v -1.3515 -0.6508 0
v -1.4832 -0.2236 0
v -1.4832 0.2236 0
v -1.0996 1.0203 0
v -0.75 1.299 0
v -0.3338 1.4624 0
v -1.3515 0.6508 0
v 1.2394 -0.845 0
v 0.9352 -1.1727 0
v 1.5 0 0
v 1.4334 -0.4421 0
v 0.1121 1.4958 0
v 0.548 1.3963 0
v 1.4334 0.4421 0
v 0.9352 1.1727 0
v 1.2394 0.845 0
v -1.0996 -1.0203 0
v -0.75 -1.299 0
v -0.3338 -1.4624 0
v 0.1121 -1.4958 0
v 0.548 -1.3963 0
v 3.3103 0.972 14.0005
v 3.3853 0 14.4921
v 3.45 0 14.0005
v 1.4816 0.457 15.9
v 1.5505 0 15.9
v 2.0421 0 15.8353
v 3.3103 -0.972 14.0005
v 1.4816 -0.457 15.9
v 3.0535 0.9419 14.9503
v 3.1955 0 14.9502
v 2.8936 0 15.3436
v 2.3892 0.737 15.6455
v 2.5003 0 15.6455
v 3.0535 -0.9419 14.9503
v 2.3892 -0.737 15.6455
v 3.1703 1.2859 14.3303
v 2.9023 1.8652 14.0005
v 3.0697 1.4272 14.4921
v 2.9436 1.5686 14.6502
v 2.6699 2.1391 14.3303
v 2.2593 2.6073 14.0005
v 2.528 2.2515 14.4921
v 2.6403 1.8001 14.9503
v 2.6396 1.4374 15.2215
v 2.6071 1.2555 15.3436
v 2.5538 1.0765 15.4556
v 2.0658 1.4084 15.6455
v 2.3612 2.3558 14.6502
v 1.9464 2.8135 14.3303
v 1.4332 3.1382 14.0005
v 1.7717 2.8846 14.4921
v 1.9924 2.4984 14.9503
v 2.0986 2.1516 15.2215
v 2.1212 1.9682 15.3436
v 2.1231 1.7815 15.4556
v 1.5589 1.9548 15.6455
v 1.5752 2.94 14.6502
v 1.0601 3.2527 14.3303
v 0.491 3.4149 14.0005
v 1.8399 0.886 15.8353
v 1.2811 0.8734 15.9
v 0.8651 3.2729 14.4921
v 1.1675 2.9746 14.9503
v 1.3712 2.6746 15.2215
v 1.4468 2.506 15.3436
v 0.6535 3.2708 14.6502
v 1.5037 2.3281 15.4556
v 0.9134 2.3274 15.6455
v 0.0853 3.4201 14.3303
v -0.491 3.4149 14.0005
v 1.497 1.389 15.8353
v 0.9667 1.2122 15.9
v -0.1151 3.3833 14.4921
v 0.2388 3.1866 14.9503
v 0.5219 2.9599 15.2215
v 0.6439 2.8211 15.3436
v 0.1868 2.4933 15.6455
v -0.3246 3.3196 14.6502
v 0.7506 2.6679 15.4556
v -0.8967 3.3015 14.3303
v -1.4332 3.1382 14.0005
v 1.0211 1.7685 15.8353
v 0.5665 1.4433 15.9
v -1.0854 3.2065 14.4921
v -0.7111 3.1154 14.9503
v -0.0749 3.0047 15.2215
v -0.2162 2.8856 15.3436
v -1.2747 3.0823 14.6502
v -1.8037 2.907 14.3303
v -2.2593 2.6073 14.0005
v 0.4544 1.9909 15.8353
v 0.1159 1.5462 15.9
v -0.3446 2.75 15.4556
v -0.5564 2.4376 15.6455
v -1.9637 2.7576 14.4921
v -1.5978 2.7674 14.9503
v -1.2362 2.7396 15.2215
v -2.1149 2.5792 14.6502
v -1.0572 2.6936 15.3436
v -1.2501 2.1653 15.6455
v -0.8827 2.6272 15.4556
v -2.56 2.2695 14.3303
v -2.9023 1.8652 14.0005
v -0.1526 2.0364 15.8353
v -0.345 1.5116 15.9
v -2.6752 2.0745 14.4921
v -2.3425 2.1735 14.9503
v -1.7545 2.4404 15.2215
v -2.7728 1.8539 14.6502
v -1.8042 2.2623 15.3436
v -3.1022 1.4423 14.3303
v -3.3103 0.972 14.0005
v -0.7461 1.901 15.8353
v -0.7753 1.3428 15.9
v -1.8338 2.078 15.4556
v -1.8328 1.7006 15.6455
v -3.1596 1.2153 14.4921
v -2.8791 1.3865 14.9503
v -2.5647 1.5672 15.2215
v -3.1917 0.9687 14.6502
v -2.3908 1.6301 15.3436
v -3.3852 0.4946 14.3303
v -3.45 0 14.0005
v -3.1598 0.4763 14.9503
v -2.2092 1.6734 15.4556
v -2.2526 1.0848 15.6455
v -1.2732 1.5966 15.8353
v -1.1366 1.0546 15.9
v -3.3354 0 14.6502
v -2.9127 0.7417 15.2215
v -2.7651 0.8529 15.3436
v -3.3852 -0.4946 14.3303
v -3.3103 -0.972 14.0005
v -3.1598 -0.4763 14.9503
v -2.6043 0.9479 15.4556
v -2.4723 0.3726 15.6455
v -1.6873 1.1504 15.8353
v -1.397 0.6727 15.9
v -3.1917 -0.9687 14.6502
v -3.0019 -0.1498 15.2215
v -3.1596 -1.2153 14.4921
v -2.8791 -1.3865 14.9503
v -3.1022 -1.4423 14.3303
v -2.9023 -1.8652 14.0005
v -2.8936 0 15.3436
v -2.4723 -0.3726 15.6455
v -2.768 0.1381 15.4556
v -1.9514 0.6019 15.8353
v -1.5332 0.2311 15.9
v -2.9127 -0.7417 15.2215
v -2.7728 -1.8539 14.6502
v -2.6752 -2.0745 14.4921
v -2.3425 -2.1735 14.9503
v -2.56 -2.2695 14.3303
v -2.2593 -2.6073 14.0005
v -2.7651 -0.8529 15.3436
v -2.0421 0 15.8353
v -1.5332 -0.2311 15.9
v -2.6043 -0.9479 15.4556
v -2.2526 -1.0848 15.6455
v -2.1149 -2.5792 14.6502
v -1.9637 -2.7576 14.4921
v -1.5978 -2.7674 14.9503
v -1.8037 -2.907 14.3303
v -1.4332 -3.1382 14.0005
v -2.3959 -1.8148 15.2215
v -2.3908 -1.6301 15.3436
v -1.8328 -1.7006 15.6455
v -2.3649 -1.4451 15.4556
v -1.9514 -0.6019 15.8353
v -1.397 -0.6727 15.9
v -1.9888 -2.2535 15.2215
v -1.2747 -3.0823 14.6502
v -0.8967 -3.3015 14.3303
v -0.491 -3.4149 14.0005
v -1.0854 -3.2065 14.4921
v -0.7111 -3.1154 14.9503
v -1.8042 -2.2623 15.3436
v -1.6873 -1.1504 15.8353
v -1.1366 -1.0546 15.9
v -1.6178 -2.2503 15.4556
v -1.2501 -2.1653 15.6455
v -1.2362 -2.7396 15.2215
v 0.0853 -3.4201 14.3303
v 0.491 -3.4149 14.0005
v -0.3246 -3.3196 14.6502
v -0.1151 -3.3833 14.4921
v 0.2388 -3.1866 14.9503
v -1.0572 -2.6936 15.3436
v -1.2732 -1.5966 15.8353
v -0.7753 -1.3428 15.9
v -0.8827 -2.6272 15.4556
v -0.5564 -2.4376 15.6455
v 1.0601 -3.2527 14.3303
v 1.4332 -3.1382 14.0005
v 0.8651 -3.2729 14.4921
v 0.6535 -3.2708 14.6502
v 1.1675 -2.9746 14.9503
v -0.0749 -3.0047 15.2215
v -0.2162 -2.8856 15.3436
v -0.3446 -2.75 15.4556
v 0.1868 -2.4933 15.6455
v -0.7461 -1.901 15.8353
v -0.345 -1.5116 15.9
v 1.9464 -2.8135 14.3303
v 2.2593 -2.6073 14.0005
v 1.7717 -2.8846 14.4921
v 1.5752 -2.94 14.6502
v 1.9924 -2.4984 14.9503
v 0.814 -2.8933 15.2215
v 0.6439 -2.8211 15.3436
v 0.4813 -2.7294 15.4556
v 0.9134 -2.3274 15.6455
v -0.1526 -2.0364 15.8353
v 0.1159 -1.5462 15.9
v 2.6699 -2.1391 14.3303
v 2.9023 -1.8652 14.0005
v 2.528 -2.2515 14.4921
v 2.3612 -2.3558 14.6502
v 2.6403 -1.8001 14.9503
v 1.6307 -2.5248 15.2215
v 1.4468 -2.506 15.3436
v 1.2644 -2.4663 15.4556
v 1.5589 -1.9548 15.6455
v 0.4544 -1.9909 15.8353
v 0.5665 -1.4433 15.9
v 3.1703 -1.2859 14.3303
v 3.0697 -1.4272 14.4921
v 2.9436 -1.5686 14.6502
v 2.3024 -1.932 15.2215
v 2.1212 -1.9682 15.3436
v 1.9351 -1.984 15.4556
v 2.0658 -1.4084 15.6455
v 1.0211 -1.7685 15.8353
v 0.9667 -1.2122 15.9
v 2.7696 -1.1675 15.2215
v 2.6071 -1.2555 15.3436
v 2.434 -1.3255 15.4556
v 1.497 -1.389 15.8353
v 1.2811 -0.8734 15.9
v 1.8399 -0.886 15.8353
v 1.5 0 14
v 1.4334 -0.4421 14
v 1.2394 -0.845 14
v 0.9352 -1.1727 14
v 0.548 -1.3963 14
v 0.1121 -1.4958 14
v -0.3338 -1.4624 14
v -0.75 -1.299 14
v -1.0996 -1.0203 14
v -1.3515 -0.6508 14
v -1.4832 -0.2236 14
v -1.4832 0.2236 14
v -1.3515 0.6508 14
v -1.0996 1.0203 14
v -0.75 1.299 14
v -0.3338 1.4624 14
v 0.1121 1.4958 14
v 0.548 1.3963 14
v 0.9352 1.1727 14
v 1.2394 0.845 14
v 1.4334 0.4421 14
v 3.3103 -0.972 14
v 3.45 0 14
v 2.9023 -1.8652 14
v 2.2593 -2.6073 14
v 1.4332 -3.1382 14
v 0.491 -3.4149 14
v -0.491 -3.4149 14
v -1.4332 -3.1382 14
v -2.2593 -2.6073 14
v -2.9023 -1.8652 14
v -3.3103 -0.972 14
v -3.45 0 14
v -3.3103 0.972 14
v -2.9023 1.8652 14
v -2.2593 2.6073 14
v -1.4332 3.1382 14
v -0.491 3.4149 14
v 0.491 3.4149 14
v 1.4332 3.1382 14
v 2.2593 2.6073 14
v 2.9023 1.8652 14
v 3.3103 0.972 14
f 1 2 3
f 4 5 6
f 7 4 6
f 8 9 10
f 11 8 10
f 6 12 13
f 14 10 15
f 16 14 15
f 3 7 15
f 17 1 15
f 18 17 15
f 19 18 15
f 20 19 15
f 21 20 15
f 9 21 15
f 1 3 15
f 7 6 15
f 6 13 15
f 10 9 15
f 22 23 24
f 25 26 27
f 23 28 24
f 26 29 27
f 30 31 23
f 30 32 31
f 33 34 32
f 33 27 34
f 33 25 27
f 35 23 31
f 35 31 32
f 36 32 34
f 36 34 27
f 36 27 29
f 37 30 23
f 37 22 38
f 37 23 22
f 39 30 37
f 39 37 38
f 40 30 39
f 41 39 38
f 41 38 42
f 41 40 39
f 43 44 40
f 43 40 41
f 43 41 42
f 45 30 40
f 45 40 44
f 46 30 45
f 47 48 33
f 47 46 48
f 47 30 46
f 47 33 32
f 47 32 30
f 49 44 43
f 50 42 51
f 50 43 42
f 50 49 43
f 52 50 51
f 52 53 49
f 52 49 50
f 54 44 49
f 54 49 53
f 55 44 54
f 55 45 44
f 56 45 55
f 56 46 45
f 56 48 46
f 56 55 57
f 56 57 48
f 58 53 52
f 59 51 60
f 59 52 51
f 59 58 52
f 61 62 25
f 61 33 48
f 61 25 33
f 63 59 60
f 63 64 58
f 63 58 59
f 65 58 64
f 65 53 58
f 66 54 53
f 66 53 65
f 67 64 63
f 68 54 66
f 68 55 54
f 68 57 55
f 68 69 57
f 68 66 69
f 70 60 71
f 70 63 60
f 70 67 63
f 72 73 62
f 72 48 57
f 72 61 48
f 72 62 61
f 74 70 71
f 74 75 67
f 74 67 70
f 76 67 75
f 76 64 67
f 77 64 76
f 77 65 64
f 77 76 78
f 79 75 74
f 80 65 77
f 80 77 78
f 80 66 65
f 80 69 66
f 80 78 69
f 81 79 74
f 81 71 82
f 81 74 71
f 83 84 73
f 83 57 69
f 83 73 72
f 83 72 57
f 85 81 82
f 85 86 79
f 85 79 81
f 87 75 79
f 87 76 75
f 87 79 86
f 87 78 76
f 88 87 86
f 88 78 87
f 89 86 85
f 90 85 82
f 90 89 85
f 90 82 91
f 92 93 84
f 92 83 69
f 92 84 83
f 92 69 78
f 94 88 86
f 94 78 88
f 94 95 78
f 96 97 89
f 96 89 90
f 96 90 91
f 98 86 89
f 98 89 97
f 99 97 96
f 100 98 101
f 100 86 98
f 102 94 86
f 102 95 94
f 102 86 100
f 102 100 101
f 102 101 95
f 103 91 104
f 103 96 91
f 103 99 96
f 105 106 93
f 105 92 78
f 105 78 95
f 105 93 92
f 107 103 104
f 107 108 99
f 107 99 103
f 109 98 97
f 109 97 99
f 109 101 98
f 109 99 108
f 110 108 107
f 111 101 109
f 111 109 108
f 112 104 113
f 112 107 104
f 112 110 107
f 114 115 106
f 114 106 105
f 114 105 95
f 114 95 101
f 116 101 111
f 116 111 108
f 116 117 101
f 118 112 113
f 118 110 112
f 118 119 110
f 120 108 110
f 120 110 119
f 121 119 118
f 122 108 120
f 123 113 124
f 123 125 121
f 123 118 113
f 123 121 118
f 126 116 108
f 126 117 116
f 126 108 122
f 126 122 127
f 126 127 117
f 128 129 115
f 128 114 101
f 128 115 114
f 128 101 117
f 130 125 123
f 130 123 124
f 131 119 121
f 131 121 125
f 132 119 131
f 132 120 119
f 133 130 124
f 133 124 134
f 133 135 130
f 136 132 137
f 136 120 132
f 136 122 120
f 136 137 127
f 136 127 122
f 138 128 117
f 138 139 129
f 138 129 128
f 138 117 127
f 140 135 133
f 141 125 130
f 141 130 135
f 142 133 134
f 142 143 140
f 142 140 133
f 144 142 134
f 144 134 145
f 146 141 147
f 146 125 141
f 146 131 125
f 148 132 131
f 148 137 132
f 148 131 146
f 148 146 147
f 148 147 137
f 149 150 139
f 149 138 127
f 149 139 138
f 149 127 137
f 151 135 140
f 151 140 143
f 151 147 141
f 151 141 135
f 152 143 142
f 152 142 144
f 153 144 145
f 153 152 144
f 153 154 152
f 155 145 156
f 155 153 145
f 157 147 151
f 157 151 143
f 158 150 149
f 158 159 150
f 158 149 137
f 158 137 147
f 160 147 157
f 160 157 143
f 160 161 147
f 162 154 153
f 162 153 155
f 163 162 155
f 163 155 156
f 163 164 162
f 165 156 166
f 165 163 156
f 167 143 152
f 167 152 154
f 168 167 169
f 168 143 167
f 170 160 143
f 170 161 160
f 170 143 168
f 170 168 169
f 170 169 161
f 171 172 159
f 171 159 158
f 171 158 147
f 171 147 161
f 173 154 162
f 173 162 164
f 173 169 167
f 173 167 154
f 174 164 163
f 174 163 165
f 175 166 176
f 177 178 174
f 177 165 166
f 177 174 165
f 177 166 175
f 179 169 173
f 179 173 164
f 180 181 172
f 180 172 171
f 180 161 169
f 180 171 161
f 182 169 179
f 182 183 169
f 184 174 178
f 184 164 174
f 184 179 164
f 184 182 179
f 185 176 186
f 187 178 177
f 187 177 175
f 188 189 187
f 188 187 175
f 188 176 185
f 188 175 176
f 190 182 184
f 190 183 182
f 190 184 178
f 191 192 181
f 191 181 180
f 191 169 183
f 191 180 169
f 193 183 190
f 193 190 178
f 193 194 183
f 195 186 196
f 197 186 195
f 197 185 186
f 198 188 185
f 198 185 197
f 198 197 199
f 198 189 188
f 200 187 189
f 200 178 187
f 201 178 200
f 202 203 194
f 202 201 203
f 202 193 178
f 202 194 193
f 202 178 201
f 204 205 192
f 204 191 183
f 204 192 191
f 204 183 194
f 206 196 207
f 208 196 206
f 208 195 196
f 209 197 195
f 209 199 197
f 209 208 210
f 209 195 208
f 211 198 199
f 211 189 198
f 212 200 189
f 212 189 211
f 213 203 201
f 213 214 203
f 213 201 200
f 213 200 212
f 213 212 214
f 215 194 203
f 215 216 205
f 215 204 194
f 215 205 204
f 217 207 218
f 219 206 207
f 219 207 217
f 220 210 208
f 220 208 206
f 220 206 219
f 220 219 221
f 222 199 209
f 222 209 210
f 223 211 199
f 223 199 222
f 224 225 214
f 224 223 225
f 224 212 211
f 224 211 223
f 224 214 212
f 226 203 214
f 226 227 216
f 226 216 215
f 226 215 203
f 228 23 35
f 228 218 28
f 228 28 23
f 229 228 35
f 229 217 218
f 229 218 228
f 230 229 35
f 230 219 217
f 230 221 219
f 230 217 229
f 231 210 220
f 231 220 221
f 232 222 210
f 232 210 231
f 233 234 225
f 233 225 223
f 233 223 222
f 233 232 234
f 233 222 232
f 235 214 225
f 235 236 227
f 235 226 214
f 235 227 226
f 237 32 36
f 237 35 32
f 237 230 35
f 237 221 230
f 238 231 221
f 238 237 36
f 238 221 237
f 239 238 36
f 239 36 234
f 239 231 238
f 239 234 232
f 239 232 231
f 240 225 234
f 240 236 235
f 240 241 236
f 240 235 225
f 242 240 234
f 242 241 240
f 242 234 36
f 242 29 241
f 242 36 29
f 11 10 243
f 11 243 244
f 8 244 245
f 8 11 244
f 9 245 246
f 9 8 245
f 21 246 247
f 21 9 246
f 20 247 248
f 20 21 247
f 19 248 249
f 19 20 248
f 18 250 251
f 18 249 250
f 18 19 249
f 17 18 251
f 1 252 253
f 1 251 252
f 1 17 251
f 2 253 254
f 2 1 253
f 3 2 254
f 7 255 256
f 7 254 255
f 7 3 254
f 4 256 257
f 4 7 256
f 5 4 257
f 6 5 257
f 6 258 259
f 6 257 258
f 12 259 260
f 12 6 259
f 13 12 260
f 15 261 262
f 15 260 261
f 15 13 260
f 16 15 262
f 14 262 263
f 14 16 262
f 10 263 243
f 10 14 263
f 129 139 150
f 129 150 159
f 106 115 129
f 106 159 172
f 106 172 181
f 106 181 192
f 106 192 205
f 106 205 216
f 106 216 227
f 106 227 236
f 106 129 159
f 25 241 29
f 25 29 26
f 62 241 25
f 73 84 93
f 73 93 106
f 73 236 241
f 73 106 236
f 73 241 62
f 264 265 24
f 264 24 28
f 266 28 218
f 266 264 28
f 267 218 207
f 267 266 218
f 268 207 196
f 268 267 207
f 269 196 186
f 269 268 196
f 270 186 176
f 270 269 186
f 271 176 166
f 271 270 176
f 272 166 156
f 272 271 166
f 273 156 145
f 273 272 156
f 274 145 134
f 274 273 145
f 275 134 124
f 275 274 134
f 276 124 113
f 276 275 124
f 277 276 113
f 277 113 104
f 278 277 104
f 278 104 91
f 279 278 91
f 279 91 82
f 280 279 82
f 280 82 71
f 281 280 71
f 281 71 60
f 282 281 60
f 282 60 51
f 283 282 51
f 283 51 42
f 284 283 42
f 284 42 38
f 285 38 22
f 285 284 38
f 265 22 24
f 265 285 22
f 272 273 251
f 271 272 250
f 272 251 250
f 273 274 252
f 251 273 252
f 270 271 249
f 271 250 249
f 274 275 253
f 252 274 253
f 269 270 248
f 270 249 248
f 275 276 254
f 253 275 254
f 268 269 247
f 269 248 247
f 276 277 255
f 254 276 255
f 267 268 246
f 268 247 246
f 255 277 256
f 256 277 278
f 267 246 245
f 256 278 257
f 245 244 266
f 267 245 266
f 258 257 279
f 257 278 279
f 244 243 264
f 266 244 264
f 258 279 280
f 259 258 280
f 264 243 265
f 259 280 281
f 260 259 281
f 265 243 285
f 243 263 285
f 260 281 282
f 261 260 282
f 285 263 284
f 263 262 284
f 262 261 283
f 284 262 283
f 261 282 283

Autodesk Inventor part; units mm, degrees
ref_plane "YZ Plane" through (0, 0, 0) normal (1, 0, 0) x (0, 1, 0)
ref_plane "XZ Plane" through (0, 0, 0) normal (0, 1, 0) x (-1, 0, 0)
ref_plane "XY Plane" through (0, 0, 0) normal (0, 0, 1) x (1, 0, 0)
sketch "スケッチ1" plane through (0, 0, 0) normal (0, 0, 1) x (1, 0, 0)
  circle A0 centre (0, 0) radius 1.5
  dimension "d0" = 3
extrude "押し出し1" add sketch "スケッチ1" along normal blind 14
sketch "スケッチ2" plane through (0, 0, 14) normal (0, 0, 1) x (1, 0, 0)
  circle A0 centre (0, 0) radius 3.45
  dimension "d3" = 6.9
extrude "押し出し2" add sketch "スケッチ2" along normal blind 1.9
fillet "フィレット1" radius 1.9 1 edges at (-3.45, 0, 15.9)
thread "ねじ1" size "M3x0.5" class "6g" standard "ANSI Metric M Profile" full length
properties part number "M3トラス頭ネジ　14" material "鉄 灰色"
